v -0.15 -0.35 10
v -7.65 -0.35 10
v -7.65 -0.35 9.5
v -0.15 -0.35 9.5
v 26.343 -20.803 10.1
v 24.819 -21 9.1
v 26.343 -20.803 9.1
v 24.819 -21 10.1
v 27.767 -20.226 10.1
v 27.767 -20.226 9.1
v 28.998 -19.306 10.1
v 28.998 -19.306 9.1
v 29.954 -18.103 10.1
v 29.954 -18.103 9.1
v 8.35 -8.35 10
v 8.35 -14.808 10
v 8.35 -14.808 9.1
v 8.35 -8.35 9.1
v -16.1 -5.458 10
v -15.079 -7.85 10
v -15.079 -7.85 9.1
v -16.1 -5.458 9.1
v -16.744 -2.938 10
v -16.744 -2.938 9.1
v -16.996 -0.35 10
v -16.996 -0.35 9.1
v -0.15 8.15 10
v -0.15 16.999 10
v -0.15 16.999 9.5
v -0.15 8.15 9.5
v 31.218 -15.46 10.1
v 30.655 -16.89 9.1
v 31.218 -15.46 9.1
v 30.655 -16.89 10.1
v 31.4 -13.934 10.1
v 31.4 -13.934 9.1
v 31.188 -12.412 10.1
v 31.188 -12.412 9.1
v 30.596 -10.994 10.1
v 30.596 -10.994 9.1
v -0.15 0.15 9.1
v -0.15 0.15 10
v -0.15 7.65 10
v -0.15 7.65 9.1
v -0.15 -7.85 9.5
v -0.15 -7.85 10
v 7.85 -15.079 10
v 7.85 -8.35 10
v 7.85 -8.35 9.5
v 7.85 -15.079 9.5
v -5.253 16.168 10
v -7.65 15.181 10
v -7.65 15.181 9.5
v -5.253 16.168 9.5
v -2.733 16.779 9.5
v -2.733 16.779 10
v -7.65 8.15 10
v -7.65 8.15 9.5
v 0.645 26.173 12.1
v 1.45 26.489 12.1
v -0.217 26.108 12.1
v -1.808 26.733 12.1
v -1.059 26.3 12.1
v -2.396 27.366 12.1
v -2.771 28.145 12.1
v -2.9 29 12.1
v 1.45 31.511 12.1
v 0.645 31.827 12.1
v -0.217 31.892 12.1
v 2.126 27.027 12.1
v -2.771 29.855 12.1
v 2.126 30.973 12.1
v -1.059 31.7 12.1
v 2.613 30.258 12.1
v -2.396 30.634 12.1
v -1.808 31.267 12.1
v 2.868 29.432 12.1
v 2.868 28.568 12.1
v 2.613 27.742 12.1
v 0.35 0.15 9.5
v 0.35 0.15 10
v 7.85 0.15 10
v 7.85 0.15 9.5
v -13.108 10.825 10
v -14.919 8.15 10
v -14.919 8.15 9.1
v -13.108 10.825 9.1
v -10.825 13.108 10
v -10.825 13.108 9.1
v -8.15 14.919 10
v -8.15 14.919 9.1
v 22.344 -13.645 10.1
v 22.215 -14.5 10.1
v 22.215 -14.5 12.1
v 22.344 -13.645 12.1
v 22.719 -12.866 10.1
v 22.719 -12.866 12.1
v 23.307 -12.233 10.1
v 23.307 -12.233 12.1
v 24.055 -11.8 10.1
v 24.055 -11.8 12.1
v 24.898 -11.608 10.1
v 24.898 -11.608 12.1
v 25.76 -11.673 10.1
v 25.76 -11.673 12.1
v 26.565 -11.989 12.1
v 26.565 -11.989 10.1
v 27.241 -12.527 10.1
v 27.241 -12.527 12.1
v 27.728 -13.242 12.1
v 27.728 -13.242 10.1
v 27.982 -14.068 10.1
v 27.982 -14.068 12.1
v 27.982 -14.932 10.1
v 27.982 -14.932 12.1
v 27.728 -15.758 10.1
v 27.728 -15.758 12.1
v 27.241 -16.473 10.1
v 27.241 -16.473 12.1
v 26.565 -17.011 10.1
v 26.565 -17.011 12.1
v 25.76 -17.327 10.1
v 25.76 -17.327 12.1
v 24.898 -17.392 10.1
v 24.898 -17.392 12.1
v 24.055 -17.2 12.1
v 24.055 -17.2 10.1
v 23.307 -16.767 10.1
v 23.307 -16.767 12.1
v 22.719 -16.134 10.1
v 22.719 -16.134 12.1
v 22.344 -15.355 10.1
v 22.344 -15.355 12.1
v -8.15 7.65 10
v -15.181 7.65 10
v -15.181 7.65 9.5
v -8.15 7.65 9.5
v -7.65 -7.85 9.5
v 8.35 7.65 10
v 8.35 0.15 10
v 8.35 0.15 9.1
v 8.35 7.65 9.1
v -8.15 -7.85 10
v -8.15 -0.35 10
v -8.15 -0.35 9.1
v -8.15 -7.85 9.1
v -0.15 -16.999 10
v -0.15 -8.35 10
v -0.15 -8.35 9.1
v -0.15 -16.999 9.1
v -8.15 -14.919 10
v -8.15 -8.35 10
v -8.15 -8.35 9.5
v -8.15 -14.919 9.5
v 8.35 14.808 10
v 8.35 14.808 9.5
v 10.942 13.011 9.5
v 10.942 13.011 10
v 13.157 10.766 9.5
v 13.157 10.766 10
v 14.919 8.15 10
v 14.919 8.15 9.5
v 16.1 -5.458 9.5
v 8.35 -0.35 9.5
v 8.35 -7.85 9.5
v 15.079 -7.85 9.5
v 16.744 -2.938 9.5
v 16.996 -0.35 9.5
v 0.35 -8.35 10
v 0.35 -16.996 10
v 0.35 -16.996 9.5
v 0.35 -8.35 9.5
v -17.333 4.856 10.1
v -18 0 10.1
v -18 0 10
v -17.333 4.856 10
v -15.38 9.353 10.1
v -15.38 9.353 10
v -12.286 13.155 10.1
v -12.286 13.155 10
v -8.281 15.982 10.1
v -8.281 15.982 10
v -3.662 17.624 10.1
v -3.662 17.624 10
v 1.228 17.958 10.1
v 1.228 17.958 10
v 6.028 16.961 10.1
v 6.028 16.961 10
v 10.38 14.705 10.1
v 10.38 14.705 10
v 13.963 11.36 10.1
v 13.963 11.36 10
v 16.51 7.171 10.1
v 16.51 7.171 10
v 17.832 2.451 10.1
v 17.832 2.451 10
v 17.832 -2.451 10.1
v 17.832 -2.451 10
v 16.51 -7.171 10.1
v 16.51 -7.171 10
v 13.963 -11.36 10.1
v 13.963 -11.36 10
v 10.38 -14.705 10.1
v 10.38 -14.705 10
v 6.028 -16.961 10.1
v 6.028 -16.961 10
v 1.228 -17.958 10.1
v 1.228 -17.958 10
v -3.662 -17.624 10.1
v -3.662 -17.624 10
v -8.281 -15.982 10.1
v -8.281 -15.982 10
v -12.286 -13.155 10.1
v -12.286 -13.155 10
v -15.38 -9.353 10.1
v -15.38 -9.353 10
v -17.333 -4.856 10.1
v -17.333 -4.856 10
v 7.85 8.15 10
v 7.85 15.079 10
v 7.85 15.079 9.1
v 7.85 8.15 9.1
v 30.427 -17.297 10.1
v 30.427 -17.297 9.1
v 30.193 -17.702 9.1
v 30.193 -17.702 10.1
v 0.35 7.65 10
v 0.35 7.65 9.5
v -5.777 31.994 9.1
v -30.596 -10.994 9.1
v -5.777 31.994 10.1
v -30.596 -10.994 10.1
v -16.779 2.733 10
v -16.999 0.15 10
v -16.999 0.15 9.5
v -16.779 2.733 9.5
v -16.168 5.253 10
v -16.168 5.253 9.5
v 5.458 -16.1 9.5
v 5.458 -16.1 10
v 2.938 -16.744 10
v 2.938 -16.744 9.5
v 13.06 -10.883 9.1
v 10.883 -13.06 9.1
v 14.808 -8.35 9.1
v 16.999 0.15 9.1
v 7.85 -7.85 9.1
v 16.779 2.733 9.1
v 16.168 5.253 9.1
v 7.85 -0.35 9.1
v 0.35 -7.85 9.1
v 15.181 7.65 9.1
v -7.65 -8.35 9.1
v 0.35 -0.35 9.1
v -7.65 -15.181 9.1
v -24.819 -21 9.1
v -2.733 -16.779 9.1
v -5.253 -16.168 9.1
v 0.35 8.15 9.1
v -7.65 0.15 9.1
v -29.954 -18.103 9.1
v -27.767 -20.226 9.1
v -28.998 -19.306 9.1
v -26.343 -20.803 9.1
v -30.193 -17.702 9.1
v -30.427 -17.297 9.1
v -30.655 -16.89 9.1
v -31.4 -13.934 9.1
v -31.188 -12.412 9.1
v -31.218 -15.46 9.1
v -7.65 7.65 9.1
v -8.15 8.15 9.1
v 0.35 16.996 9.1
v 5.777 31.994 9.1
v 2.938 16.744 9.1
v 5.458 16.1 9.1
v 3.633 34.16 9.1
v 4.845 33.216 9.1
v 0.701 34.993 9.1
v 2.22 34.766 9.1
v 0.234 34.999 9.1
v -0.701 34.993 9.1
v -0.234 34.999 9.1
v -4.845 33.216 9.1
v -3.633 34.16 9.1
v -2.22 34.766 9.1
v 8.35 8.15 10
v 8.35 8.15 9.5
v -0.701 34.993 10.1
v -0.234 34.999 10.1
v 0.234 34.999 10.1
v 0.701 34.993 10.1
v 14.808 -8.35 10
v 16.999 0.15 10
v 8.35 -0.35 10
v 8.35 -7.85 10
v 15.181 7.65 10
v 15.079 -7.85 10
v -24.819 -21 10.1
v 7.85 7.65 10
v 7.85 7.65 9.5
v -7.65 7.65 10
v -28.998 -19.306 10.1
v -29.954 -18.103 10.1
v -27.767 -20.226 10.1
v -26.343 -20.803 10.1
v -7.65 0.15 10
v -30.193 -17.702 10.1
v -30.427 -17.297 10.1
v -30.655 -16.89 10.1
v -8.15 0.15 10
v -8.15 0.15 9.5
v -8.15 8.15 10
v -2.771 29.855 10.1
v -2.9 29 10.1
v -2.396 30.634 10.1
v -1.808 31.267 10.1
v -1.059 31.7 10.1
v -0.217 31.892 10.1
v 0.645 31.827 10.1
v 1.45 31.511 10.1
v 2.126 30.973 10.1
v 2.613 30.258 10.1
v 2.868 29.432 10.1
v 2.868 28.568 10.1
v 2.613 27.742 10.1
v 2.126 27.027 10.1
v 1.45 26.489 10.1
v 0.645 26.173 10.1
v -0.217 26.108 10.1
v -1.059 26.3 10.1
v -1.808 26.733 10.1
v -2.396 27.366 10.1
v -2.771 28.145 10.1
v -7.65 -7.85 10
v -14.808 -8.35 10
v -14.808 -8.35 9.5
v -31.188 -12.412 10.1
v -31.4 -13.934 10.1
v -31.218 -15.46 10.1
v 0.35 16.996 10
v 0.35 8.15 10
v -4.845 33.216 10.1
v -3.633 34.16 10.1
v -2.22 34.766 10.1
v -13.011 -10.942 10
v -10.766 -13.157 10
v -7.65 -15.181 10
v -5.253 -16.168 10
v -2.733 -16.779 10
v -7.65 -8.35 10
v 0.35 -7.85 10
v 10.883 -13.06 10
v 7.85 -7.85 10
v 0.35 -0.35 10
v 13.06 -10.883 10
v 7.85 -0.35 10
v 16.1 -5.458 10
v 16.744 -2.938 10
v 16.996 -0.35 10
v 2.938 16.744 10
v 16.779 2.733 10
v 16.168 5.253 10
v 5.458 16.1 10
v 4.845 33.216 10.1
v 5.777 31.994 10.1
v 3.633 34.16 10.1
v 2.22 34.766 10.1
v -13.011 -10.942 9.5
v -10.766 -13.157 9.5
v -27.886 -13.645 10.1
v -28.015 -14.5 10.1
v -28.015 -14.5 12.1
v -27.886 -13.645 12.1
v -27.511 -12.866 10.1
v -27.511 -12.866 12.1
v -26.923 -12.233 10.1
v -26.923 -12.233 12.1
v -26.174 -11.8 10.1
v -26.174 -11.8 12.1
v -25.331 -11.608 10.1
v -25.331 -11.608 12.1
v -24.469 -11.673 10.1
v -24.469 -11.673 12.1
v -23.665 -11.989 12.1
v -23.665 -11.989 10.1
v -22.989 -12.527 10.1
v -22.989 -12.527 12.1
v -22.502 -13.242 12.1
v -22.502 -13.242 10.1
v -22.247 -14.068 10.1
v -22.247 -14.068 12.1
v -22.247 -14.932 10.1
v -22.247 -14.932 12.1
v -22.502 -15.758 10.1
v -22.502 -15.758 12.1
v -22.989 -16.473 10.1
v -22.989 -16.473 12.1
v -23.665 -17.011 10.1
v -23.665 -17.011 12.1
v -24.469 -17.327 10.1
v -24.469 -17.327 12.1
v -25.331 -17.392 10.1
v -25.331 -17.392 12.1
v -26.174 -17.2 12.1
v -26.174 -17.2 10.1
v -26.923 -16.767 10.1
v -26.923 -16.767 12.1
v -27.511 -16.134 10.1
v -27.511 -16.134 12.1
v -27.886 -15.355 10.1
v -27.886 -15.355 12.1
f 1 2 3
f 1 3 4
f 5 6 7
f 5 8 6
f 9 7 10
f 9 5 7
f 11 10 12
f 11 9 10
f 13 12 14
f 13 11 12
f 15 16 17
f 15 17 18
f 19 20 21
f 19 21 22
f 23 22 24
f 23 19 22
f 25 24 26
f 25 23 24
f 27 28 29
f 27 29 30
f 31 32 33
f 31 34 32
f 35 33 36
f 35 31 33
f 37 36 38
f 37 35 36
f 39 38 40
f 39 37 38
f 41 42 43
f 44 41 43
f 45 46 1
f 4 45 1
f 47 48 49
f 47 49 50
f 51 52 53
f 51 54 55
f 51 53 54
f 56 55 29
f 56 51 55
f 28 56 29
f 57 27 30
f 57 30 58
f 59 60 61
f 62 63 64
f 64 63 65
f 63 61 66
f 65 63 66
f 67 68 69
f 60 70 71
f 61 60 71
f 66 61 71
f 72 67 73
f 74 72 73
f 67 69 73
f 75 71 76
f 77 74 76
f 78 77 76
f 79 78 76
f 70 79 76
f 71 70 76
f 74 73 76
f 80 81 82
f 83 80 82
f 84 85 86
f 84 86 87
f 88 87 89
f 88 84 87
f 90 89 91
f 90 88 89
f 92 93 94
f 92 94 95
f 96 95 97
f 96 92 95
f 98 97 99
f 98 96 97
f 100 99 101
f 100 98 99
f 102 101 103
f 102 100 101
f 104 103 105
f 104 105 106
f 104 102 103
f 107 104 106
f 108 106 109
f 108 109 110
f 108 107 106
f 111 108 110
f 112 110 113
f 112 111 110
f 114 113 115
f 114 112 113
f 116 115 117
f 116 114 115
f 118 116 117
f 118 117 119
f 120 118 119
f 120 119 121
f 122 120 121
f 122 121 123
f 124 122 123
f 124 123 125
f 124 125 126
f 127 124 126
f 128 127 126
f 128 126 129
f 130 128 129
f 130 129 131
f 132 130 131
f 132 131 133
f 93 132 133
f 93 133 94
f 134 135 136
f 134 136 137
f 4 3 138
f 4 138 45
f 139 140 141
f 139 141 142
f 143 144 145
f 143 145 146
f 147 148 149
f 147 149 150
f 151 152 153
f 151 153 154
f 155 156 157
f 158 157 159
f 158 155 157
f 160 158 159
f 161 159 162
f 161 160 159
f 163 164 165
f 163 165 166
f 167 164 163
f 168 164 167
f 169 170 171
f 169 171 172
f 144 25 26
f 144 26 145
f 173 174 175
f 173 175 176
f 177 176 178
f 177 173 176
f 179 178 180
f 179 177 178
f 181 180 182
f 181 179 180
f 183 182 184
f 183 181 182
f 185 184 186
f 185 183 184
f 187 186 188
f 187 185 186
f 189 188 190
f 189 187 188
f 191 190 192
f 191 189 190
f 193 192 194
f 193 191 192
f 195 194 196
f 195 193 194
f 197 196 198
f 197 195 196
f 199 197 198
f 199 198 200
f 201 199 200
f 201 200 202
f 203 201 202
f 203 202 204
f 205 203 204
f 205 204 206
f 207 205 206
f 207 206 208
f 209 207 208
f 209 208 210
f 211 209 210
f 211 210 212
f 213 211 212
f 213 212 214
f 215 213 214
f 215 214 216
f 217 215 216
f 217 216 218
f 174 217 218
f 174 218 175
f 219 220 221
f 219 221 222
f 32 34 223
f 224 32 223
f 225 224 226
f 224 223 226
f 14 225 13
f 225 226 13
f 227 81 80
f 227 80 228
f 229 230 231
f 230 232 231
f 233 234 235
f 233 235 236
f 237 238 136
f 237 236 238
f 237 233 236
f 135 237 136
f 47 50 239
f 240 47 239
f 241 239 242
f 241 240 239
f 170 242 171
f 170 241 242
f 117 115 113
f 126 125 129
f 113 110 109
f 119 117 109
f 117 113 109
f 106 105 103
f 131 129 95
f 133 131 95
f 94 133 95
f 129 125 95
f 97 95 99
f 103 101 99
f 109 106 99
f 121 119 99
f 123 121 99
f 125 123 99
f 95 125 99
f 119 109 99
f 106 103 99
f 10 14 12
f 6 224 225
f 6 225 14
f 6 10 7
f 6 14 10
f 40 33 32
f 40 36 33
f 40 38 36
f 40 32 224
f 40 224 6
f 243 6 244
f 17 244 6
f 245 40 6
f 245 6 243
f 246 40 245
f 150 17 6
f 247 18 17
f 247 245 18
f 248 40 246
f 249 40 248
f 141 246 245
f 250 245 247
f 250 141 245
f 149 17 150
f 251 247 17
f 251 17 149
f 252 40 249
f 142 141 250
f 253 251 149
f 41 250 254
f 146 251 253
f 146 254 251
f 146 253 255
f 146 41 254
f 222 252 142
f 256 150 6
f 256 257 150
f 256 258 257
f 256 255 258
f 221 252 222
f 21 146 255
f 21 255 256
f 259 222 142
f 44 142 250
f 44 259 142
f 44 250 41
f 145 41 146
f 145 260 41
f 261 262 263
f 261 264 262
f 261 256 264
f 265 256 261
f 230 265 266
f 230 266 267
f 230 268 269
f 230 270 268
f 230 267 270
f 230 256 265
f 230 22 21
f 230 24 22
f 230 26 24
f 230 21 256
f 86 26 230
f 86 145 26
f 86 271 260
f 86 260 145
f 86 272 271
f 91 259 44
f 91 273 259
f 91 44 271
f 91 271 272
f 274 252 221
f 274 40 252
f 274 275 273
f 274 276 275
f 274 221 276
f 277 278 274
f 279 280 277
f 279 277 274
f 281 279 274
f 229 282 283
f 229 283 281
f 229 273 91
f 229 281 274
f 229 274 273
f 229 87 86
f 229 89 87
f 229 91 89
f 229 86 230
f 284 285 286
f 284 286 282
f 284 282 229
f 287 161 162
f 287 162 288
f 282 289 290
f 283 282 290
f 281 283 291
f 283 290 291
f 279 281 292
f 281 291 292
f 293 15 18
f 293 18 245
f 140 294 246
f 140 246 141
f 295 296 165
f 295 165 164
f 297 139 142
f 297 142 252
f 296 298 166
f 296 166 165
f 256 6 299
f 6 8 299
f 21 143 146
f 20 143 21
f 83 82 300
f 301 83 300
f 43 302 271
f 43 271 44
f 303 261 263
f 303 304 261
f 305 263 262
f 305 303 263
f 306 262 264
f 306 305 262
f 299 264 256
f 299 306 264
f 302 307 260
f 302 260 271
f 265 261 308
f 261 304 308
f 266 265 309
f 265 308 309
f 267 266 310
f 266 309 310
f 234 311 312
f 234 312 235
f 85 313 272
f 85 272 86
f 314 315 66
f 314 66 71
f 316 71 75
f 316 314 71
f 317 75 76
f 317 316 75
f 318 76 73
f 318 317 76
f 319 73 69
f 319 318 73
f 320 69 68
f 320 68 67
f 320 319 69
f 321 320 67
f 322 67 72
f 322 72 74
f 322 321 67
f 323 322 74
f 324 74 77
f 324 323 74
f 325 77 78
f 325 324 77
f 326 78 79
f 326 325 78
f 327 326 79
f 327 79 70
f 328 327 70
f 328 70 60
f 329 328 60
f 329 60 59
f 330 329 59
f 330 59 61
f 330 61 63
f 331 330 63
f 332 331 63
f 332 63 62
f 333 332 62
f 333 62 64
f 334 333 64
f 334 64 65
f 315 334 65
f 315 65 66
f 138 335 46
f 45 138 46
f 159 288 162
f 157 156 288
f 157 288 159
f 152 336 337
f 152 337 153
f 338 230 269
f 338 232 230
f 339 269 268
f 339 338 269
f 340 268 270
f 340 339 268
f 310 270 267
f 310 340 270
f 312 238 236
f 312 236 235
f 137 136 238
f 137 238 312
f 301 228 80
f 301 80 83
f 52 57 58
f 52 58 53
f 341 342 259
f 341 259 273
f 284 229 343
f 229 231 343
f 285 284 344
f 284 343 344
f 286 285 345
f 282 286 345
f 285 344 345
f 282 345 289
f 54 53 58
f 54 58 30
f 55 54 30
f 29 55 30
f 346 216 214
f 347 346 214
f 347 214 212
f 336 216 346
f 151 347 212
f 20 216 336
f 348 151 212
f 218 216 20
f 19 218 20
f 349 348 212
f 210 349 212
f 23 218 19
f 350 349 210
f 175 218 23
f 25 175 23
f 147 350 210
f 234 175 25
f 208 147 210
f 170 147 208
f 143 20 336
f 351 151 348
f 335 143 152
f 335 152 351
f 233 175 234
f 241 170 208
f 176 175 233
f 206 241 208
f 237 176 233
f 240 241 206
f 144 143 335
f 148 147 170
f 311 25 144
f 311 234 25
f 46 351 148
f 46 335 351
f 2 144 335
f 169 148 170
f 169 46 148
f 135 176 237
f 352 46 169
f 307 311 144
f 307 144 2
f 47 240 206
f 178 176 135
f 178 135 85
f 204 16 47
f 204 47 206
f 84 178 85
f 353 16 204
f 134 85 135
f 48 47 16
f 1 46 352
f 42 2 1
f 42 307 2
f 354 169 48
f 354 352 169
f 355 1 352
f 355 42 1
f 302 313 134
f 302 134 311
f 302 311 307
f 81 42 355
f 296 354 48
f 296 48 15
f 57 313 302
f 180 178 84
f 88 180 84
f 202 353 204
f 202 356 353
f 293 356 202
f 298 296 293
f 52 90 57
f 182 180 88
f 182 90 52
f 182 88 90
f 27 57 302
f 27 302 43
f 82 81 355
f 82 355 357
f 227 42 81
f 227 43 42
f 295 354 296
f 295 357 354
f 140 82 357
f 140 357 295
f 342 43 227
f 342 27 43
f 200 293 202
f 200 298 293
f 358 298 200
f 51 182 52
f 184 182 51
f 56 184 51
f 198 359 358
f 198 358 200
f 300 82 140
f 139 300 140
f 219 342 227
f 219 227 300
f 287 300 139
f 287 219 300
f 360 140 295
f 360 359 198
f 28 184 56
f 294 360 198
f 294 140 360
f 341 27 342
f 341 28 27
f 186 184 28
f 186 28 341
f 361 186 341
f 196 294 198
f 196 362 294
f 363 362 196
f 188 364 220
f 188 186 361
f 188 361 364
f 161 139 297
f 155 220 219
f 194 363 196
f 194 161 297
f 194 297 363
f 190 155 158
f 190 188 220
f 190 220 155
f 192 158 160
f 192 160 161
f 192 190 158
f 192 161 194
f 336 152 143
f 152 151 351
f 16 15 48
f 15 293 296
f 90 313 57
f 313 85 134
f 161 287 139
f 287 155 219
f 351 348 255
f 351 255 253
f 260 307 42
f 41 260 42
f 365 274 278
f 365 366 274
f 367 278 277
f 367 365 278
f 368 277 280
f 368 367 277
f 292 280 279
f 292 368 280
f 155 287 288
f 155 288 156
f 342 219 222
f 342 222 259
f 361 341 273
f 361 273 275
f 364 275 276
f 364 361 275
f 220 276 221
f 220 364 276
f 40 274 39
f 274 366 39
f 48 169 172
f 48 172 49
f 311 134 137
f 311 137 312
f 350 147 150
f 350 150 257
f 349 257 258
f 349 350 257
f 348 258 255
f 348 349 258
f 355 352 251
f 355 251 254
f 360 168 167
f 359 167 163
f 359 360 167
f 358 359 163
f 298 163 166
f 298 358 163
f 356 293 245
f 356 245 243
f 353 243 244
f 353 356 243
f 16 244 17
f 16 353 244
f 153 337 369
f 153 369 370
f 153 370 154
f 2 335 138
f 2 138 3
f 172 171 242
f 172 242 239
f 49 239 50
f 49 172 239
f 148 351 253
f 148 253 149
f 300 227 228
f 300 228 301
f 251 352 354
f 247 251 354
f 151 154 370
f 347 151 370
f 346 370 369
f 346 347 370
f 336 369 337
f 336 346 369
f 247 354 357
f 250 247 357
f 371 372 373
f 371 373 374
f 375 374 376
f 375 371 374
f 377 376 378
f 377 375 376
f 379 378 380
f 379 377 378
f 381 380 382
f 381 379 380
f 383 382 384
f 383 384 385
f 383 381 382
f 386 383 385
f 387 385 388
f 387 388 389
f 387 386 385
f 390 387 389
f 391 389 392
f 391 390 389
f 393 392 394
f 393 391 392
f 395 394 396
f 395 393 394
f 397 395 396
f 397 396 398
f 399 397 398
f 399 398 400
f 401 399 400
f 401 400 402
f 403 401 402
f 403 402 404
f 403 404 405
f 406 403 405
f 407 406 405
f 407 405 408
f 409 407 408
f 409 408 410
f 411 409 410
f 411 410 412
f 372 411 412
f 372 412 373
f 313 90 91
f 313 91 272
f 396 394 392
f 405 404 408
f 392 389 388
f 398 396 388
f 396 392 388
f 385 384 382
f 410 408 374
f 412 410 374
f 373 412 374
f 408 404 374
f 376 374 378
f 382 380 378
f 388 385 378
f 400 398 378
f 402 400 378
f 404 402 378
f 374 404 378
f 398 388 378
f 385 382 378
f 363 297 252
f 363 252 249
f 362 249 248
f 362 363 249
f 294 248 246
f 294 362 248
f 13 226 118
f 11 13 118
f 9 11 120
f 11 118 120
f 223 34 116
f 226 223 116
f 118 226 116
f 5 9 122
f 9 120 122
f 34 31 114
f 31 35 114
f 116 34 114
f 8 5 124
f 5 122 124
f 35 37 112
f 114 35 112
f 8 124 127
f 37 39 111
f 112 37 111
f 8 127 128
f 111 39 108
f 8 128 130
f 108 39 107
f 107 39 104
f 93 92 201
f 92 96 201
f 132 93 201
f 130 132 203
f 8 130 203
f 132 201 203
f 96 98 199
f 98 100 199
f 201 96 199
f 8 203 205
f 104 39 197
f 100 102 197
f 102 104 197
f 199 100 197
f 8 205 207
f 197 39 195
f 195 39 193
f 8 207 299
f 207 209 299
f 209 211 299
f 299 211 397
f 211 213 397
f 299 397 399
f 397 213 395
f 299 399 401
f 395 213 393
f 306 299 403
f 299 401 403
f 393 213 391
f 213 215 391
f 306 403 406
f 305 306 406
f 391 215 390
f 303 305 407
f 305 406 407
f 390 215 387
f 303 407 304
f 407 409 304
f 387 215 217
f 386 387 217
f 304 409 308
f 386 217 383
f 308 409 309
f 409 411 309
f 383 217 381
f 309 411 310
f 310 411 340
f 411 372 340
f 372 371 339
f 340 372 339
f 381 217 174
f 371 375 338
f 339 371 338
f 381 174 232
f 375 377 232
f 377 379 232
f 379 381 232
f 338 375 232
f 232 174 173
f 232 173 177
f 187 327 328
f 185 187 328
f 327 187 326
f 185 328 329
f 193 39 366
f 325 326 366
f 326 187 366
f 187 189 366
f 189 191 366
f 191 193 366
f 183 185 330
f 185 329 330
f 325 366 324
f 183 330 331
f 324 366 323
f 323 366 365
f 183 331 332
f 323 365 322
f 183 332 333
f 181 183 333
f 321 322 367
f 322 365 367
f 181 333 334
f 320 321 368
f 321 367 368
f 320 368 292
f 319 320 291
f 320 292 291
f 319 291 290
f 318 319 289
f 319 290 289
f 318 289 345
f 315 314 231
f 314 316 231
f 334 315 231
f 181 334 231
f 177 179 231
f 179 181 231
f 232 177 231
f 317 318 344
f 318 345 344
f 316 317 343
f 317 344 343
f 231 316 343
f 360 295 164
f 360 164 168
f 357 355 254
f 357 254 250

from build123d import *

# Parameters (mm, degrees)
SKETCH2_R               = 18
SKETCH2_W               = 7.5
SKETCH2_H               = 7.5
BOSS_EXTRUDE1_DEPTH     = 0.9
BOSS_EXTRUDE10_START    = 0.4
SKETCH18_W              = 7.7
SKETCH18_H              = 7.7
BOSS_EXTRUDE10_DEPTH    = 0.4
BOSS_EXTRUDE2_START     = -1
SKETCH3_R               = 35
SKETCH3_R_2             = 18
BOSS_EXTRUDE2_DEPTH     = 1
SKETCH4_R               = 2.9
BOSS_EXTRUDE3_DEPTH     = 3
CUT_EXTRUDE1_DEPTH      = 50.588305073
CUT_EXTRUDE1_DEPTH_BACK = 50.588305073
SKETCH7_R               = 59.131365533
FILLET1_R               = 6


with BuildPart() as part:
    # Sketch2 → Boss-Extrude1 (new body)
    with BuildSketch(Plane.XY.offset(10)):
        Circle(SKETCH2_R)
        with BuildLine():
            Line((-8.15, -8.35), (-8.15, -14.91903147))
            ThreePointArc((-8.15, -14.91903147), (-11.939670478, -12.101415986), (-14.808021475, -8.35))
            Line((-14.808021475, -8.35), (-8.15, -8.35))
        make_face(mode=Mode.SUBTRACT)
        with BuildLine():
            Line((-8.15, -7.85), (-15.079041747, -7.85))
            ThreePointArc((-15.079041747, -7.85), (-16.470304718, -4.210589327), (-16.996396677, -0.35))
            Line((-16.996396677, -0.35), (-8.15, -0.35))
            Line((-8.15, -0.35), (-8.15, -7.85))
        make_face(mode=Mode.SUBTRACT)
        with BuildLine():
            Line((-8.15, 0.15), (-16.999338222, 0.15))
            ThreePointArc((-16.999338222, 0.15), (-16.521617742, 4.00451585), (-15.181485435, 7.65))
            Line((-15.181485435, 7.65), (-8.15, 7.65))
            Line((-8.15, 7.65), (-8.15, 0.15))
        make_face(mode=Mode.SUBTRACT)
        with BuildLine():
            Line((-8.15, 8.15), (-14.91903147, 8.15))
            ThreePointArc((-14.91903147, 8.15), (-12.02081528, 12.02081528), (-8.15, 14.91903147))
            Line((-8.15, 14.91903147), (-8.15, 8.15))
        make_face(mode=Mode.SUBTRACT)
        with BuildLine():
            Line((-7.65, 8.15), (-7.65, 15.181485435))
            ThreePointArc((-7.65, 15.181485435), (-4.00451585, 16.521617742), (-0.15, 16.999338222))
            Line((-0.15, 16.999338222), (-0.15, 8.15))
            Line((-0.15, 8.15), (-7.65, 8.15))
        make_face(mode=Mode.SUBTRACT)
        with BuildLine():
            Line((0.35, 8.15), (0.35, 16.996396677))
            ThreePointArc((0.35, 16.996396677), (4.210589327, 16.470304718), (7.85, 15.079041747))
            Line((7.85, 15.079041747), (7.85, 8.15))
            Line((7.85, 8.15), (0.35, 8.15))
        make_face(mode=Mode.SUBTRACT)
        with BuildLine():
            Line((8.35, 8.15), (8.35, 14.808021475))
            ThreePointArc((8.35, 14.808021475), (12.101415986, 11.939670478), (14.91903147, 8.15))
            Line((14.91903147, 8.15), (8.35, 8.15))
        make_face(mode=Mode.SUBTRACT)
        with BuildLine():
            Line((8.35, 7.65), (15.181485435, 7.65))
            ThreePointArc((15.181485435, 7.65), (16.521617742, 4.00451585), (16.999338222, 0.15))
            Line((16.999338222, 0.15), (8.35, 0.15))
            Line((8.35, 0.15), (8.35, 7.65))
        make_face(mode=Mode.SUBTRACT)
        with BuildLine():
            Line((8.35, -0.35), (16.996396677, -0.35))
            ThreePointArc((16.996396677, -0.35), (16.470304718, -4.210589327), (15.079041747, -7.85))
            Line((15.079041747, -7.85), (8.35, -7.85))
            Line((8.35, -7.85), (8.35, -0.35))
        make_face(mode=Mode.SUBTRACT)
        with BuildLine():
            Line((8.35, -8.35), (14.808021475, -8.35))
            ThreePointArc((14.808021475, -8.35), (12.02081528, -12.02081528), (8.35, -14.808021475))
            Line((8.35, -14.808021475), (8.35, -8.35))
        make_face(mode=Mode.SUBTRACT)
        with BuildLine():
            Line((7.85, -8.35), (7.85, -15.079041747))
            ThreePointArc((7.85, -15.079041747), (4.210589327, -16.470304718), (0.35, -16.996396677))
            Line((0.35, -16.996396677), (0.35, -8.35))
            Line((0.35, -8.35), (7.85, -8.35))
        make_face(mode=Mode.SUBTRACT)
        with BuildLine():
            Line((-0.15, -8.35), (-0.15, -16.999338222))
            ThreePointArc((-0.15, -16.999338222), (-4.00451585, -16.521617742), (-7.65, -15.181485435))
            Line((-7.65, -15.181485435), (-7.65, -8.35))
            Line((-7.65, -8.35), (-0.15, -8.35))
        make_face(mode=Mode.SUBTRACT)
        with Locations((-3.9, -4.1)):
            Rectangle(SKETCH2_W, SKETCH2_H, mode=Mode.SUBTRACT)
        with Locations((4.1, -4.1)):
            Rectangle(SKETCH2_W, SKETCH2_H, mode=Mode.SUBTRACT)
        with Locations((-3.9, 3.9)):
            Rectangle(SKETCH2_W, SKETCH2_H, mode=Mode.SUBTRACT)
        with Locations((4.1, 3.9)):
            Rectangle(SKETCH2_W, SKETCH2_H, mode=Mode.SUBTRACT)
    extrude(amount=-BOSS_EXTRUDE1_DEPTH)

    # Sketch18 → Boss-Extrude10 (add)
    with BuildSketch(Plane.XY.offset(9.1).offset(BOSS_EXTRUDE10_START)):
        with BuildLine():
            ThreePointArc((-0.15, 16.999338222), (-4.11362184, 16.494790552), (-7.85, 15.079041747))
            Line((-7.85, 15.079041747), (-7.85, 8.15))
            Line((-7.85, 8.15), (-0.15, 8.15))
            Line((-0.15, 8.15), (-0.15, 16.999338222))
        make_face()
        with Locations((4, 4)):
            Rectangle(SKETCH18_W, SKETCH18_H)
        with Locations((-4, -4)):
            Rectangle(SKETCH18_W, SKETCH18_H)
        with BuildLine():
            Line((8.15, 8.15), (14.91903147, 8.15))
            ThreePointArc((14.91903147, 8.15), (12.02081528, 12.02081528), (8.15, 14.91903147))
            Line((8.15, 14.91903147), (8.15, 8.15))
        make_face()
        with BuildLine():
            ThreePointArc((-15.079041747, 7.85), (-16.494790552, 4.11362184), (-16.999338222, 0.15))
            Line((-16.999338222, 0.15), (-8.15, 0.15))
            Line((-8.15, 0.15), (-8.15, 7.85))
            Line((-8.15, 7.85), (-15.079041747, 7.85))
        make_face()
        with BuildLine():
            Line((0.15, -8.15), (0.15, -16.999338222))
            ThreePointArc((0.15, -16.999338222), (4.11362184, -16.494790552), (7.85, -15.079041747))
            Line((7.85, -15.079041747), (7.85, -8.15))
            Line((7.85, -8.15), (0.15, -8.15))
        make_face()
        with BuildLine():
            ThreePointArc((-14.91903147, -8.15), (-12.02081528, -12.02081528), (-8.15, -14.91903147))
            Line((-8.15, -14.91903147), (-8.15, -8.15))
            Line((-8.15, -8.15), (-14.91903147, -8.15))
        make_face()
        with BuildLine():
            Line((8.15, -7.85), (15.079041747, -7.85))
            ThreePointArc((15.079041747, -7.85), (16.494790552, -4.11362184), (16.999338222, -0.15))
            Line((16.999338222, -0.15), (8.15, -0.15))
            Line((8.15, -0.15), (8.15, -7.85))
        make_face()
    extrude(amount=-BOSS_EXTRUDE10_DEPTH)

    # Sketch3 → Boss-Extrude2 (add)
    with BuildSketch(Plane(origin=(0, 0, 9.1), x_dir=(-1, 0, 0), z_dir=(0, 0, -1)).offset(BOSS_EXTRUDE2_START)):
        Circle(SKETCH3_R)
        Circle(SKETCH3_R_2, mode=Mode.SUBTRACT)
    extrude(amount=BOSS_EXTRUDE2_DEPTH)

    # Sketch4 → Boss-Extrude3 (add)
    with BuildSketch(Plane(origin=(0, 0, 9.1), x_dir=(-1, 0, 0), z_dir=(0, 0, -1))):
        with Locations((0, 29)):
            Circle(SKETCH4_R)
        with Locations((25.11473671, -14.5)):
            Circle(SKETCH4_R)
        with Locations((-25.11473671, -14.5)):
            Circle(SKETCH4_R)
    extrude(amount=-BOSS_EXTRUDE3_DEPTH)

    # Sketch7 → Cut-Extrude1 (cut, two sides: drawn at the far end of the back side and taken through both)
    with BuildSketch(Plane(origin=(0, 0, 9.1), x_dir=(-1, 0, 0), z_dir=(0, 0, -1)).offset(-CUT_EXTRUDE1_DEPTH_BACK)):
        Circle(SKETCH7_R)
        Polygon((0, 42), (-36.373066959, -21), (36.373066959, -21), align=None, mode=Mode.SUBTRACT)
    extrude(amount=CUT_EXTRUDE1_DEPTH + CUT_EXTRUDE1_DEPTH_BACK, mode=Mode.SUBTRACT)

    # Fillet1
    fillet1_edges = [part.edges().sort_by_distance(p)[0] for p in [
        (-4.186533479, 34.748711306, 9.6),
        (-32.186533479, -13.748711306, 9.6),
        (-28, -21, 9.6),
        (28, -21, 9.6),
        (32.186533479, -13.748711306, 9.6),
        (4.186533479, 34.748711306, 9.6),
    ]]
    fillet(fillet1_edges, radius=FILLET1_R)


solid = part.part
